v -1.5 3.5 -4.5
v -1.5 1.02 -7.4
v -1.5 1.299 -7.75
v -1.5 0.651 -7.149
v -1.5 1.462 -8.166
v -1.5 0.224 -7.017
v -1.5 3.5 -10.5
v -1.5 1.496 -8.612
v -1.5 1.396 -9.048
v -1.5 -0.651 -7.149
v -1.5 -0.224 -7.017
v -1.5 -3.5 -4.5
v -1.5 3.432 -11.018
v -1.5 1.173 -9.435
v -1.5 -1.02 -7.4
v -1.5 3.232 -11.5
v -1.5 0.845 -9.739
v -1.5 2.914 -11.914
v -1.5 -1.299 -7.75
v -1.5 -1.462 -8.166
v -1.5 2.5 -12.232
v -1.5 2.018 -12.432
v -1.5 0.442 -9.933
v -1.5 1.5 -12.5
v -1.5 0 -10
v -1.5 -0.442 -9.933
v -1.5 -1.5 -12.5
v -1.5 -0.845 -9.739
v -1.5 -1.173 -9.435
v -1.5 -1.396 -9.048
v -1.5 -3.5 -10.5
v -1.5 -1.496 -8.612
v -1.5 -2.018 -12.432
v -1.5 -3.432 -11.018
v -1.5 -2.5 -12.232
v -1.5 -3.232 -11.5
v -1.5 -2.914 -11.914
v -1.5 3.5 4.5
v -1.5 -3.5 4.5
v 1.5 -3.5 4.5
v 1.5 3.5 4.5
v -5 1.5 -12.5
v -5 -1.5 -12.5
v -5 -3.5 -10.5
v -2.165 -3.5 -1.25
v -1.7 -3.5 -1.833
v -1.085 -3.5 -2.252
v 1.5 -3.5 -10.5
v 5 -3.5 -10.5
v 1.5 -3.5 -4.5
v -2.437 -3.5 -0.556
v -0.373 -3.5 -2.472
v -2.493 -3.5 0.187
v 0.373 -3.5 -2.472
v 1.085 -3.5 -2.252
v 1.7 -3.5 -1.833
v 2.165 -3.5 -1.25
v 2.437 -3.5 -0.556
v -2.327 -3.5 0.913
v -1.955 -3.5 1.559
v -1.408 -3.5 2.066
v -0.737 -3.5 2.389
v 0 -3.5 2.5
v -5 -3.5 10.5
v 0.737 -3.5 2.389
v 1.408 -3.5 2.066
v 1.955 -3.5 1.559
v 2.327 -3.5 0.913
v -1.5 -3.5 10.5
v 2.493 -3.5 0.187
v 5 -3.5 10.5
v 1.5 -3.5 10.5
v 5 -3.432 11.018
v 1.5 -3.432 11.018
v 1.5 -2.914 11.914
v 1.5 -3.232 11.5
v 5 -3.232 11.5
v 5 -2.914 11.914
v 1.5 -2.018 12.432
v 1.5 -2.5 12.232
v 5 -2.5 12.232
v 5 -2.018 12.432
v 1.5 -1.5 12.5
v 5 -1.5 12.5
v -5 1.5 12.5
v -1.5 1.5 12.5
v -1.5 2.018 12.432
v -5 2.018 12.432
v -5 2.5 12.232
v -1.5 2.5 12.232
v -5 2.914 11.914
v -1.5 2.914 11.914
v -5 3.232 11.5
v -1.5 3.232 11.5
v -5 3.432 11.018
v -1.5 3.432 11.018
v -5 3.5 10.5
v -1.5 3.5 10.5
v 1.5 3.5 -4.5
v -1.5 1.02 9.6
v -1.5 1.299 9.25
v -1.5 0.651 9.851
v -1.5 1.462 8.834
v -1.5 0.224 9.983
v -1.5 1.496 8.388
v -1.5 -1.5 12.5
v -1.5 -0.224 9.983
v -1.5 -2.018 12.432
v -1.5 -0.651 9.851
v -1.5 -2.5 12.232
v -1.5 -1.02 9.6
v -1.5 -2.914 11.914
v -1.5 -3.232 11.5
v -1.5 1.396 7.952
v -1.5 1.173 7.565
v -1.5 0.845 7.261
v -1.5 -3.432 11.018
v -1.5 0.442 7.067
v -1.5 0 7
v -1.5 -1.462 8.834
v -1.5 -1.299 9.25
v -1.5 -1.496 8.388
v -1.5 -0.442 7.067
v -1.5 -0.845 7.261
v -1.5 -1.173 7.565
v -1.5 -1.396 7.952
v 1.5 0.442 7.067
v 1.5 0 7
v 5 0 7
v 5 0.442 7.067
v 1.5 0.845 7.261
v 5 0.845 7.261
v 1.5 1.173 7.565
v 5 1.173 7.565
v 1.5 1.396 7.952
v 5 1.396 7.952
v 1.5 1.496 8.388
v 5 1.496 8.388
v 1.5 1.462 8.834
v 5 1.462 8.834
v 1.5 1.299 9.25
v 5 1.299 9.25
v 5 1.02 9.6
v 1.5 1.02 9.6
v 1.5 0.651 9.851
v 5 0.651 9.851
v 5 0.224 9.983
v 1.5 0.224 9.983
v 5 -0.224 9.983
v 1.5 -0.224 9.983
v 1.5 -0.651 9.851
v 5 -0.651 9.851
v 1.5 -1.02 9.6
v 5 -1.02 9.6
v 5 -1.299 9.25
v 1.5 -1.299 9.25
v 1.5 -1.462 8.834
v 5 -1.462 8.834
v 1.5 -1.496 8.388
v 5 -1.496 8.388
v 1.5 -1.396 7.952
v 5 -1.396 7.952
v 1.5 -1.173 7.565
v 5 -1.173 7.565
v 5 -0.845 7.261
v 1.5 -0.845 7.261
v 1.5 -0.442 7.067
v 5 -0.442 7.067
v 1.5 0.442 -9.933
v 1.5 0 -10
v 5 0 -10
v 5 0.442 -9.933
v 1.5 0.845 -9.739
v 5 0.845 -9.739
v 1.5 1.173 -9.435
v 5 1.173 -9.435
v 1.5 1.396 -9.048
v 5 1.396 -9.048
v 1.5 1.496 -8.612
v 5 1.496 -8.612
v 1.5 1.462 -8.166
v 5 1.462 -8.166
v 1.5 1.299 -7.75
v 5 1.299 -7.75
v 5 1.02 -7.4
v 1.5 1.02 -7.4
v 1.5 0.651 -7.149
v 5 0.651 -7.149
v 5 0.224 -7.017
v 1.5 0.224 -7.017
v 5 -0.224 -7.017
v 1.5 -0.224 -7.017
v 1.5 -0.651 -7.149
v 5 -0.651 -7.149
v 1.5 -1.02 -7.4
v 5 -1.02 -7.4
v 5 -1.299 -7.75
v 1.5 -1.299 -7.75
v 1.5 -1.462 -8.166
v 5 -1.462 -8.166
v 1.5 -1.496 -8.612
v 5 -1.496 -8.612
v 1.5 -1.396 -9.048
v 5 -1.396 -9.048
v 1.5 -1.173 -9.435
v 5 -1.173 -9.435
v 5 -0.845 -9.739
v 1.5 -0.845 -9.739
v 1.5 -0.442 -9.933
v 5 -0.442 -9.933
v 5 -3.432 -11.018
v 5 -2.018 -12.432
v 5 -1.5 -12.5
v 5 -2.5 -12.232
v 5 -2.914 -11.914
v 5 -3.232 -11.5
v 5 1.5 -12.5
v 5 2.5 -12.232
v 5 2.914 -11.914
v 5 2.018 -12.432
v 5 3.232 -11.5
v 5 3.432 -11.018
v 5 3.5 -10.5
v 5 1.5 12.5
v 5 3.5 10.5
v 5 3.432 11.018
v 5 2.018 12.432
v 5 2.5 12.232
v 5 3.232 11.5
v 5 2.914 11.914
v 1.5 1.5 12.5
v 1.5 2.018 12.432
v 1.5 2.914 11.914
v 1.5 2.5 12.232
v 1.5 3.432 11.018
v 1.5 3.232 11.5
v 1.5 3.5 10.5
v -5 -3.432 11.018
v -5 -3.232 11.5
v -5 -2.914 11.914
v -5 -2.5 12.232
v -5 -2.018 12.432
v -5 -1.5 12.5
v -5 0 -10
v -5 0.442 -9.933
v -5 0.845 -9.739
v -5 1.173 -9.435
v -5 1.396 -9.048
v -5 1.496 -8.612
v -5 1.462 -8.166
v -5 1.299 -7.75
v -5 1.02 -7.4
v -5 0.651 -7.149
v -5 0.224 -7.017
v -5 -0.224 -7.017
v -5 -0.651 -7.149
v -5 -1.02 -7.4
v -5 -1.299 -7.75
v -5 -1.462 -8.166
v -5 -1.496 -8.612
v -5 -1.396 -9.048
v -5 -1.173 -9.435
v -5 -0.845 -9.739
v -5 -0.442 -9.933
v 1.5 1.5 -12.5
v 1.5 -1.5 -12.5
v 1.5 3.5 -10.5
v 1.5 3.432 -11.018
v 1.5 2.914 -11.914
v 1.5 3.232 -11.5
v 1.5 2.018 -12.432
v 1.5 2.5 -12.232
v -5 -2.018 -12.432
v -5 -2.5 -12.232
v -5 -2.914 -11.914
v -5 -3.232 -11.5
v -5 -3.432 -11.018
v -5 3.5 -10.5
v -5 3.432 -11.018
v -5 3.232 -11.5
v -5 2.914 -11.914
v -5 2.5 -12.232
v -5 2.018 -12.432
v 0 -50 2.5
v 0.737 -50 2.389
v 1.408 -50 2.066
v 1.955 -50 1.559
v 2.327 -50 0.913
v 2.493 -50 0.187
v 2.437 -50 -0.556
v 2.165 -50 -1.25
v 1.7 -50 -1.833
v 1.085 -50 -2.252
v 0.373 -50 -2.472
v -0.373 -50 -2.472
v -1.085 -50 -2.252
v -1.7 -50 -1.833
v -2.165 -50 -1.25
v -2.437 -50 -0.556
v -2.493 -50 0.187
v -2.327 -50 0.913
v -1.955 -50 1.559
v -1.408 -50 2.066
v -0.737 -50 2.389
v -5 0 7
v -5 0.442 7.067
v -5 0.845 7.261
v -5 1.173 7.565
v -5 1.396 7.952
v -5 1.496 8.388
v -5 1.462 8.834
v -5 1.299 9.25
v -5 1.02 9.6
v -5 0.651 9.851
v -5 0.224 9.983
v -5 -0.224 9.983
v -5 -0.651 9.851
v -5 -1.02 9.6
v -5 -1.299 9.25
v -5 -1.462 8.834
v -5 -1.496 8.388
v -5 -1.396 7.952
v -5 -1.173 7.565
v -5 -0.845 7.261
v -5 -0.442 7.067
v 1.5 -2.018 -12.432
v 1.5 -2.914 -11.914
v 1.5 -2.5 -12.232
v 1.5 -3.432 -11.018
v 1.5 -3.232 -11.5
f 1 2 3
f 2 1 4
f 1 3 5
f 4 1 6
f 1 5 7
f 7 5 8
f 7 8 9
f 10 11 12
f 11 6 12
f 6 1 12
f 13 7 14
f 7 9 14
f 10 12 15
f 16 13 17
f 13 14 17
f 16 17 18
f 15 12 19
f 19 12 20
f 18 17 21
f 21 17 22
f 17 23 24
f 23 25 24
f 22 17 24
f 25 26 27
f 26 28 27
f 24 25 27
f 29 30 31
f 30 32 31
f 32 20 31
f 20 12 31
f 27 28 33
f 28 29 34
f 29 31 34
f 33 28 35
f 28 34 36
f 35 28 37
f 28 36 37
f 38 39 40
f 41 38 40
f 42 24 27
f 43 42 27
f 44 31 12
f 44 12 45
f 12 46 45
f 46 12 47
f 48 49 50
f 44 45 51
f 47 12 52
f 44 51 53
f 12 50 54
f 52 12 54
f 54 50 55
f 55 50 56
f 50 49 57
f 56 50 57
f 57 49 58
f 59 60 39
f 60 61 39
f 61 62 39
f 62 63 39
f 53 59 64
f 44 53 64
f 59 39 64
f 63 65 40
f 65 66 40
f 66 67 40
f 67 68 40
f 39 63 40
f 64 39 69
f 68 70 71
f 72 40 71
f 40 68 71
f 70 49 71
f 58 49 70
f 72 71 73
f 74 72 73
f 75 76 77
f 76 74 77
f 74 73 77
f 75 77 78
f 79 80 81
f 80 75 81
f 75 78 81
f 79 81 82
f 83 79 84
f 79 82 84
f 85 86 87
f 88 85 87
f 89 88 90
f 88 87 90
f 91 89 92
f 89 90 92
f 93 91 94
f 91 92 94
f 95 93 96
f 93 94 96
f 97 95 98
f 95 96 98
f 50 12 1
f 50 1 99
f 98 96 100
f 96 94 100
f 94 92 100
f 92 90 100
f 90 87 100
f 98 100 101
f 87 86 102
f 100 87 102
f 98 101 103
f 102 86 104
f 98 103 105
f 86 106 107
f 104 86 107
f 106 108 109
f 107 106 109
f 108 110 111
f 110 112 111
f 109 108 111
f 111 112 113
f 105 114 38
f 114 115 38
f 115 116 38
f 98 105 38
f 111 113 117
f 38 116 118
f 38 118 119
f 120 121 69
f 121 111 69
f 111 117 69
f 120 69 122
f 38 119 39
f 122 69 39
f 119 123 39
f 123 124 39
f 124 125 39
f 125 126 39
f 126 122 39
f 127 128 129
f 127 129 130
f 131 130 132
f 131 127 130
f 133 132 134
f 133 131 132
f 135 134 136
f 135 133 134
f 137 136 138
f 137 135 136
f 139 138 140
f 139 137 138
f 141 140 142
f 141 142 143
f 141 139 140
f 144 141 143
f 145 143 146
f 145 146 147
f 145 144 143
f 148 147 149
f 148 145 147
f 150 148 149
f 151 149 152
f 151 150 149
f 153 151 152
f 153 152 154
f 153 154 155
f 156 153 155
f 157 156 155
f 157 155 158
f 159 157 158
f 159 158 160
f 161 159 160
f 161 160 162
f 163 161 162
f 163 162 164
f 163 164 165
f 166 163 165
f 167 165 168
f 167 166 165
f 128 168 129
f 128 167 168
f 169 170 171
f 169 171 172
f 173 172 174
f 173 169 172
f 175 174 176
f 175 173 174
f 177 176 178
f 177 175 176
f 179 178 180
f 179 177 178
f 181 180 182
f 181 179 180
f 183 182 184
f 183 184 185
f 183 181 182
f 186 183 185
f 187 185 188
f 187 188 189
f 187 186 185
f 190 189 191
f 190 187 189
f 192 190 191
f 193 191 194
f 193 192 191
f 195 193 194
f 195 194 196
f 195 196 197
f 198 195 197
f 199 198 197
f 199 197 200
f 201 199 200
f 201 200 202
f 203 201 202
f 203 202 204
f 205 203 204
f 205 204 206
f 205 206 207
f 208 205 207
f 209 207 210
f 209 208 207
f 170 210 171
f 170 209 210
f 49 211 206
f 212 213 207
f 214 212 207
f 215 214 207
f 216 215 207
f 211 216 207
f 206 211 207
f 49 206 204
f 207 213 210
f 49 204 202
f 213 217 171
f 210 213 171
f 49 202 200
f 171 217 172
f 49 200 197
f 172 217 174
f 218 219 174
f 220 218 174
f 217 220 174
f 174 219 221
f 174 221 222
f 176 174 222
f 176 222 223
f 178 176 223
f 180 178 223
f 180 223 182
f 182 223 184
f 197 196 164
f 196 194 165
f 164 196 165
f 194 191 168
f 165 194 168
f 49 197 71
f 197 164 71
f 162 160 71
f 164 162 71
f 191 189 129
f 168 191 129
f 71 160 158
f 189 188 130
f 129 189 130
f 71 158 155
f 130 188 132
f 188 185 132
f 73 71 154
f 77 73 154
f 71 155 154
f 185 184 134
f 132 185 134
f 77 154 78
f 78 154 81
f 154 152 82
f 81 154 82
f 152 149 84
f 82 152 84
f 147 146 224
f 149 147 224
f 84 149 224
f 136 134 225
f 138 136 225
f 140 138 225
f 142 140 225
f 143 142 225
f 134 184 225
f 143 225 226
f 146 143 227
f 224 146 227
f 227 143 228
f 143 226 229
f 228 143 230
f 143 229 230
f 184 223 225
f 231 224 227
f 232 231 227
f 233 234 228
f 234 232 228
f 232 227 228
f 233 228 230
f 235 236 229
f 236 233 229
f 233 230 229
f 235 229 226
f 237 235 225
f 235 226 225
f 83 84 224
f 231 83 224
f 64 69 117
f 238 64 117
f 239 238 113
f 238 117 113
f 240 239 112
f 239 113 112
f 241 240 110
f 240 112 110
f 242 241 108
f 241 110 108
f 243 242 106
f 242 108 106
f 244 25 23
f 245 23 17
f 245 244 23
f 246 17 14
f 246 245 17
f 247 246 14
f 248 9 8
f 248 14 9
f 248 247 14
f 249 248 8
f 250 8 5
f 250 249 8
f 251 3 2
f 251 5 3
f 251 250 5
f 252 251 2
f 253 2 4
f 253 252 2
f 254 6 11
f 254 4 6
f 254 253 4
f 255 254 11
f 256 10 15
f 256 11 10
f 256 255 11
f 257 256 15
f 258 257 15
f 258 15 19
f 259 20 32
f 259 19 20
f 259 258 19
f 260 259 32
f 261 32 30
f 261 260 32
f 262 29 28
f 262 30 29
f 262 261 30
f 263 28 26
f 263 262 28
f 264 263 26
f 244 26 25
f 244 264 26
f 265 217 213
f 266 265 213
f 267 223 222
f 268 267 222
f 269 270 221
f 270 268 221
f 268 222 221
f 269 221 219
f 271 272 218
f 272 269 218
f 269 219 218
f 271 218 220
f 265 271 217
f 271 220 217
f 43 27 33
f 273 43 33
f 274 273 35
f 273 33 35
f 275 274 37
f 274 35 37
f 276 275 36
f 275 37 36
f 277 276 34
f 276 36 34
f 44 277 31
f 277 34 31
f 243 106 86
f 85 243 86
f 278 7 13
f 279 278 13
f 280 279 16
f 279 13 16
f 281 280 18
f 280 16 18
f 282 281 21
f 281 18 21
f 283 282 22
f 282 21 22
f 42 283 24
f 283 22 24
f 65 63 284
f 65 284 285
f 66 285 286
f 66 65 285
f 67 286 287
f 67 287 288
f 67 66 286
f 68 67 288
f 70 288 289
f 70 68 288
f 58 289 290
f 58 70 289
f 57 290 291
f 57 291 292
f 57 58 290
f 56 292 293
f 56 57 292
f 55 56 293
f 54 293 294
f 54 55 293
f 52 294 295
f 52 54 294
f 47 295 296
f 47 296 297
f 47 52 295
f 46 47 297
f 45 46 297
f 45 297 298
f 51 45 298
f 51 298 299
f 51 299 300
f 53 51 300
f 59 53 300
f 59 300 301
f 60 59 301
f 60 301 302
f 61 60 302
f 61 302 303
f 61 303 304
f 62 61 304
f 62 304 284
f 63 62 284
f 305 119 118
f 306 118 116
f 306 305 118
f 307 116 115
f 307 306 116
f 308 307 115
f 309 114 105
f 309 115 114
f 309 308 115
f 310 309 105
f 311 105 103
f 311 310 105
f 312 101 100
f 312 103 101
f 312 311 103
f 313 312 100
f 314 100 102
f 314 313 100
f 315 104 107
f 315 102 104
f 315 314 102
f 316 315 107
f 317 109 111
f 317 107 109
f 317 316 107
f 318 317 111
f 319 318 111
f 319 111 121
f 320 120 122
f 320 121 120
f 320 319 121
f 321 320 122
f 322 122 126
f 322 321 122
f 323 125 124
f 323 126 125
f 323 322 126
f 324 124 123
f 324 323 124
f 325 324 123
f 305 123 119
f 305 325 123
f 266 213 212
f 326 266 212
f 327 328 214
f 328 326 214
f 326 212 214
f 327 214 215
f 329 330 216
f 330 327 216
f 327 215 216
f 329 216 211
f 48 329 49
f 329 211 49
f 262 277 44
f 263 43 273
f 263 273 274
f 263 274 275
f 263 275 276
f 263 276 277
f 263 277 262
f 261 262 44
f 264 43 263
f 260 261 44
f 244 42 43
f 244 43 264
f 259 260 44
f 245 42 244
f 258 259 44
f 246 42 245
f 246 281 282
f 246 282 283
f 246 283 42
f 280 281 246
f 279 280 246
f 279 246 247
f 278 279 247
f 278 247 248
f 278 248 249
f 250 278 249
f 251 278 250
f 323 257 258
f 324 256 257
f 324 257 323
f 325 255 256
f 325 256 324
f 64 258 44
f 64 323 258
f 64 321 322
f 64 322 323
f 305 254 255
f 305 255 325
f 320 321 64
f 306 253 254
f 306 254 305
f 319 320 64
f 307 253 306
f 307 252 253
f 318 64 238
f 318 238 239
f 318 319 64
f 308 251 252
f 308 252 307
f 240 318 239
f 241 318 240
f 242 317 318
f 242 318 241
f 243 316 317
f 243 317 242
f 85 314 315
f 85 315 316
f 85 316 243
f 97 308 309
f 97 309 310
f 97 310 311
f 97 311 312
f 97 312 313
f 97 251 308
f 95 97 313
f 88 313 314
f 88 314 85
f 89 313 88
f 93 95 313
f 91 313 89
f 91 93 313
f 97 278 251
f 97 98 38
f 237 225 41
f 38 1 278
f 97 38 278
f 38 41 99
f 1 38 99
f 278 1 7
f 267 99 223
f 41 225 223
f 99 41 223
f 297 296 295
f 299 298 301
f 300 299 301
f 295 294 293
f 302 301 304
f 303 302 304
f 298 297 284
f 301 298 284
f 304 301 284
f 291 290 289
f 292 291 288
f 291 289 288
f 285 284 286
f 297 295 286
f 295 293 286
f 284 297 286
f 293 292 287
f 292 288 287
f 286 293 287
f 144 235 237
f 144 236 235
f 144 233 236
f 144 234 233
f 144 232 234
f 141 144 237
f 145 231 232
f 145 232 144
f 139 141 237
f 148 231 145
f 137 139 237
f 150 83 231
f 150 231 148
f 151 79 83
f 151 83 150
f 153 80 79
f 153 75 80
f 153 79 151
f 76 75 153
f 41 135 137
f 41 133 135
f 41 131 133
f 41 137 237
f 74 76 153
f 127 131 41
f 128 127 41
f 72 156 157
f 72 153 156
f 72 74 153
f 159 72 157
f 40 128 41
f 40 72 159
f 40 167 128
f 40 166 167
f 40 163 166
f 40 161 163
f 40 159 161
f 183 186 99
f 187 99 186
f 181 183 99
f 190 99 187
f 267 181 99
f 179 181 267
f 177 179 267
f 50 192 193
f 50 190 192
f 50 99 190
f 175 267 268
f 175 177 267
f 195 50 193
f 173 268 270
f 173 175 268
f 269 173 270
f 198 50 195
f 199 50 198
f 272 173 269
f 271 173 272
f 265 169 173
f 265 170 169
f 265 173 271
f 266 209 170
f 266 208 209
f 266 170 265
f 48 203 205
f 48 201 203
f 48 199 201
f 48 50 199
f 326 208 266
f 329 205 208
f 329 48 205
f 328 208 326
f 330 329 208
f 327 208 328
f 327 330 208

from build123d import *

# Parameters (mm, degrees)
CROQUIS1_R                 = 2.5
SALIENTE_EXTRUIR1_DEPTH    = 50
CROQUIS2_R                 = 1.5
SALIENTE_EXTRUIR2_DEPTH    = 5
CORTAR_EXTRUIR1_DEPTH      = 56.167925464
CORTAR_EXTRUIR1_DEPTH_BACK = 56.167925464
CROQUIS3_W                 = 3
CROQUIS3_H                 = 8


with BuildPart() as part:
    # Croquis1 → Saliente-Extruir1 (new body)
    with BuildSketch(Plane(origin=(0, 0, 0), x_dir=(1, 0, 0), z_dir=(0, 1, 0))):
        with Locations(Location((0, 0, 0), (0, 0, 270))):
            Circle(CROQUIS1_R)
    extrude(amount=-SALIENTE_EXTRUIR1_DEPTH)

    # Croquis2 → Saliente-Extruir2 (add, symmetric)
    with BuildSketch(Plane(origin=(0, 0, 0), x_dir=(0, 0, -1), z_dir=(1, 0, 0))):
        with BuildLine():
            Line((10.5, -3.5), (-10.5, -3.5))
            ThreePointArc((-10.5, -3.5), (-11.914213562, -2.914213562), (-12.5, -1.5))
            Line((-12.5, -1.5), (-12.5, 1.5))
            ThreePointArc((-12.5, 1.5), (-11.914213562, 2.914213562), (-10.5, 3.5))
            Line((-10.5, 3.5), (10.5, 3.5))
            ThreePointArc((10.5, 3.5), (11.914213562, 2.914213562), (12.5, 1.5))
            Line((12.5, 1.5), (12.5, -1.5))
            ThreePointArc((12.5, -1.5), (11.914213562, -2.914213562), (10.5, -3.5))
        make_face()
        with Locations((-8.5, 0)):
            Circle(CROQUIS2_R, mode=Mode.SUBTRACT)
        with Locations((8.5, 0)):
            Circle(CROQUIS2_R, mode=Mode.SUBTRACT)
    extrude(amount=SALIENTE_EXTRUIR2_DEPTH, both=True)

    # Croquis3 → Cortar-Extruir1 (cut, two sides: drawn at the far end of the back side and taken through both)
    with BuildSketch(Plane(origin=(0, 3.5, 0), x_dir=(1, 0, 0), z_dir=(0, 1, 0)).offset(-CORTAR_EXTRUIR1_DEPTH_BACK)):
        with Locations((0, 8.5)):
            Rectangle(CROQUIS3_W, CROQUIS3_H)
        with Locations((0, -8.5)):
            Rectangle(CROQUIS3_W, CROQUIS3_H)
    extrude(amount=CORTAR_EXTRUIR1_DEPTH + CORTAR_EXTRUIR1_DEPTH_BACK, mode=Mode.SUBTRACT)


solid = part.part
